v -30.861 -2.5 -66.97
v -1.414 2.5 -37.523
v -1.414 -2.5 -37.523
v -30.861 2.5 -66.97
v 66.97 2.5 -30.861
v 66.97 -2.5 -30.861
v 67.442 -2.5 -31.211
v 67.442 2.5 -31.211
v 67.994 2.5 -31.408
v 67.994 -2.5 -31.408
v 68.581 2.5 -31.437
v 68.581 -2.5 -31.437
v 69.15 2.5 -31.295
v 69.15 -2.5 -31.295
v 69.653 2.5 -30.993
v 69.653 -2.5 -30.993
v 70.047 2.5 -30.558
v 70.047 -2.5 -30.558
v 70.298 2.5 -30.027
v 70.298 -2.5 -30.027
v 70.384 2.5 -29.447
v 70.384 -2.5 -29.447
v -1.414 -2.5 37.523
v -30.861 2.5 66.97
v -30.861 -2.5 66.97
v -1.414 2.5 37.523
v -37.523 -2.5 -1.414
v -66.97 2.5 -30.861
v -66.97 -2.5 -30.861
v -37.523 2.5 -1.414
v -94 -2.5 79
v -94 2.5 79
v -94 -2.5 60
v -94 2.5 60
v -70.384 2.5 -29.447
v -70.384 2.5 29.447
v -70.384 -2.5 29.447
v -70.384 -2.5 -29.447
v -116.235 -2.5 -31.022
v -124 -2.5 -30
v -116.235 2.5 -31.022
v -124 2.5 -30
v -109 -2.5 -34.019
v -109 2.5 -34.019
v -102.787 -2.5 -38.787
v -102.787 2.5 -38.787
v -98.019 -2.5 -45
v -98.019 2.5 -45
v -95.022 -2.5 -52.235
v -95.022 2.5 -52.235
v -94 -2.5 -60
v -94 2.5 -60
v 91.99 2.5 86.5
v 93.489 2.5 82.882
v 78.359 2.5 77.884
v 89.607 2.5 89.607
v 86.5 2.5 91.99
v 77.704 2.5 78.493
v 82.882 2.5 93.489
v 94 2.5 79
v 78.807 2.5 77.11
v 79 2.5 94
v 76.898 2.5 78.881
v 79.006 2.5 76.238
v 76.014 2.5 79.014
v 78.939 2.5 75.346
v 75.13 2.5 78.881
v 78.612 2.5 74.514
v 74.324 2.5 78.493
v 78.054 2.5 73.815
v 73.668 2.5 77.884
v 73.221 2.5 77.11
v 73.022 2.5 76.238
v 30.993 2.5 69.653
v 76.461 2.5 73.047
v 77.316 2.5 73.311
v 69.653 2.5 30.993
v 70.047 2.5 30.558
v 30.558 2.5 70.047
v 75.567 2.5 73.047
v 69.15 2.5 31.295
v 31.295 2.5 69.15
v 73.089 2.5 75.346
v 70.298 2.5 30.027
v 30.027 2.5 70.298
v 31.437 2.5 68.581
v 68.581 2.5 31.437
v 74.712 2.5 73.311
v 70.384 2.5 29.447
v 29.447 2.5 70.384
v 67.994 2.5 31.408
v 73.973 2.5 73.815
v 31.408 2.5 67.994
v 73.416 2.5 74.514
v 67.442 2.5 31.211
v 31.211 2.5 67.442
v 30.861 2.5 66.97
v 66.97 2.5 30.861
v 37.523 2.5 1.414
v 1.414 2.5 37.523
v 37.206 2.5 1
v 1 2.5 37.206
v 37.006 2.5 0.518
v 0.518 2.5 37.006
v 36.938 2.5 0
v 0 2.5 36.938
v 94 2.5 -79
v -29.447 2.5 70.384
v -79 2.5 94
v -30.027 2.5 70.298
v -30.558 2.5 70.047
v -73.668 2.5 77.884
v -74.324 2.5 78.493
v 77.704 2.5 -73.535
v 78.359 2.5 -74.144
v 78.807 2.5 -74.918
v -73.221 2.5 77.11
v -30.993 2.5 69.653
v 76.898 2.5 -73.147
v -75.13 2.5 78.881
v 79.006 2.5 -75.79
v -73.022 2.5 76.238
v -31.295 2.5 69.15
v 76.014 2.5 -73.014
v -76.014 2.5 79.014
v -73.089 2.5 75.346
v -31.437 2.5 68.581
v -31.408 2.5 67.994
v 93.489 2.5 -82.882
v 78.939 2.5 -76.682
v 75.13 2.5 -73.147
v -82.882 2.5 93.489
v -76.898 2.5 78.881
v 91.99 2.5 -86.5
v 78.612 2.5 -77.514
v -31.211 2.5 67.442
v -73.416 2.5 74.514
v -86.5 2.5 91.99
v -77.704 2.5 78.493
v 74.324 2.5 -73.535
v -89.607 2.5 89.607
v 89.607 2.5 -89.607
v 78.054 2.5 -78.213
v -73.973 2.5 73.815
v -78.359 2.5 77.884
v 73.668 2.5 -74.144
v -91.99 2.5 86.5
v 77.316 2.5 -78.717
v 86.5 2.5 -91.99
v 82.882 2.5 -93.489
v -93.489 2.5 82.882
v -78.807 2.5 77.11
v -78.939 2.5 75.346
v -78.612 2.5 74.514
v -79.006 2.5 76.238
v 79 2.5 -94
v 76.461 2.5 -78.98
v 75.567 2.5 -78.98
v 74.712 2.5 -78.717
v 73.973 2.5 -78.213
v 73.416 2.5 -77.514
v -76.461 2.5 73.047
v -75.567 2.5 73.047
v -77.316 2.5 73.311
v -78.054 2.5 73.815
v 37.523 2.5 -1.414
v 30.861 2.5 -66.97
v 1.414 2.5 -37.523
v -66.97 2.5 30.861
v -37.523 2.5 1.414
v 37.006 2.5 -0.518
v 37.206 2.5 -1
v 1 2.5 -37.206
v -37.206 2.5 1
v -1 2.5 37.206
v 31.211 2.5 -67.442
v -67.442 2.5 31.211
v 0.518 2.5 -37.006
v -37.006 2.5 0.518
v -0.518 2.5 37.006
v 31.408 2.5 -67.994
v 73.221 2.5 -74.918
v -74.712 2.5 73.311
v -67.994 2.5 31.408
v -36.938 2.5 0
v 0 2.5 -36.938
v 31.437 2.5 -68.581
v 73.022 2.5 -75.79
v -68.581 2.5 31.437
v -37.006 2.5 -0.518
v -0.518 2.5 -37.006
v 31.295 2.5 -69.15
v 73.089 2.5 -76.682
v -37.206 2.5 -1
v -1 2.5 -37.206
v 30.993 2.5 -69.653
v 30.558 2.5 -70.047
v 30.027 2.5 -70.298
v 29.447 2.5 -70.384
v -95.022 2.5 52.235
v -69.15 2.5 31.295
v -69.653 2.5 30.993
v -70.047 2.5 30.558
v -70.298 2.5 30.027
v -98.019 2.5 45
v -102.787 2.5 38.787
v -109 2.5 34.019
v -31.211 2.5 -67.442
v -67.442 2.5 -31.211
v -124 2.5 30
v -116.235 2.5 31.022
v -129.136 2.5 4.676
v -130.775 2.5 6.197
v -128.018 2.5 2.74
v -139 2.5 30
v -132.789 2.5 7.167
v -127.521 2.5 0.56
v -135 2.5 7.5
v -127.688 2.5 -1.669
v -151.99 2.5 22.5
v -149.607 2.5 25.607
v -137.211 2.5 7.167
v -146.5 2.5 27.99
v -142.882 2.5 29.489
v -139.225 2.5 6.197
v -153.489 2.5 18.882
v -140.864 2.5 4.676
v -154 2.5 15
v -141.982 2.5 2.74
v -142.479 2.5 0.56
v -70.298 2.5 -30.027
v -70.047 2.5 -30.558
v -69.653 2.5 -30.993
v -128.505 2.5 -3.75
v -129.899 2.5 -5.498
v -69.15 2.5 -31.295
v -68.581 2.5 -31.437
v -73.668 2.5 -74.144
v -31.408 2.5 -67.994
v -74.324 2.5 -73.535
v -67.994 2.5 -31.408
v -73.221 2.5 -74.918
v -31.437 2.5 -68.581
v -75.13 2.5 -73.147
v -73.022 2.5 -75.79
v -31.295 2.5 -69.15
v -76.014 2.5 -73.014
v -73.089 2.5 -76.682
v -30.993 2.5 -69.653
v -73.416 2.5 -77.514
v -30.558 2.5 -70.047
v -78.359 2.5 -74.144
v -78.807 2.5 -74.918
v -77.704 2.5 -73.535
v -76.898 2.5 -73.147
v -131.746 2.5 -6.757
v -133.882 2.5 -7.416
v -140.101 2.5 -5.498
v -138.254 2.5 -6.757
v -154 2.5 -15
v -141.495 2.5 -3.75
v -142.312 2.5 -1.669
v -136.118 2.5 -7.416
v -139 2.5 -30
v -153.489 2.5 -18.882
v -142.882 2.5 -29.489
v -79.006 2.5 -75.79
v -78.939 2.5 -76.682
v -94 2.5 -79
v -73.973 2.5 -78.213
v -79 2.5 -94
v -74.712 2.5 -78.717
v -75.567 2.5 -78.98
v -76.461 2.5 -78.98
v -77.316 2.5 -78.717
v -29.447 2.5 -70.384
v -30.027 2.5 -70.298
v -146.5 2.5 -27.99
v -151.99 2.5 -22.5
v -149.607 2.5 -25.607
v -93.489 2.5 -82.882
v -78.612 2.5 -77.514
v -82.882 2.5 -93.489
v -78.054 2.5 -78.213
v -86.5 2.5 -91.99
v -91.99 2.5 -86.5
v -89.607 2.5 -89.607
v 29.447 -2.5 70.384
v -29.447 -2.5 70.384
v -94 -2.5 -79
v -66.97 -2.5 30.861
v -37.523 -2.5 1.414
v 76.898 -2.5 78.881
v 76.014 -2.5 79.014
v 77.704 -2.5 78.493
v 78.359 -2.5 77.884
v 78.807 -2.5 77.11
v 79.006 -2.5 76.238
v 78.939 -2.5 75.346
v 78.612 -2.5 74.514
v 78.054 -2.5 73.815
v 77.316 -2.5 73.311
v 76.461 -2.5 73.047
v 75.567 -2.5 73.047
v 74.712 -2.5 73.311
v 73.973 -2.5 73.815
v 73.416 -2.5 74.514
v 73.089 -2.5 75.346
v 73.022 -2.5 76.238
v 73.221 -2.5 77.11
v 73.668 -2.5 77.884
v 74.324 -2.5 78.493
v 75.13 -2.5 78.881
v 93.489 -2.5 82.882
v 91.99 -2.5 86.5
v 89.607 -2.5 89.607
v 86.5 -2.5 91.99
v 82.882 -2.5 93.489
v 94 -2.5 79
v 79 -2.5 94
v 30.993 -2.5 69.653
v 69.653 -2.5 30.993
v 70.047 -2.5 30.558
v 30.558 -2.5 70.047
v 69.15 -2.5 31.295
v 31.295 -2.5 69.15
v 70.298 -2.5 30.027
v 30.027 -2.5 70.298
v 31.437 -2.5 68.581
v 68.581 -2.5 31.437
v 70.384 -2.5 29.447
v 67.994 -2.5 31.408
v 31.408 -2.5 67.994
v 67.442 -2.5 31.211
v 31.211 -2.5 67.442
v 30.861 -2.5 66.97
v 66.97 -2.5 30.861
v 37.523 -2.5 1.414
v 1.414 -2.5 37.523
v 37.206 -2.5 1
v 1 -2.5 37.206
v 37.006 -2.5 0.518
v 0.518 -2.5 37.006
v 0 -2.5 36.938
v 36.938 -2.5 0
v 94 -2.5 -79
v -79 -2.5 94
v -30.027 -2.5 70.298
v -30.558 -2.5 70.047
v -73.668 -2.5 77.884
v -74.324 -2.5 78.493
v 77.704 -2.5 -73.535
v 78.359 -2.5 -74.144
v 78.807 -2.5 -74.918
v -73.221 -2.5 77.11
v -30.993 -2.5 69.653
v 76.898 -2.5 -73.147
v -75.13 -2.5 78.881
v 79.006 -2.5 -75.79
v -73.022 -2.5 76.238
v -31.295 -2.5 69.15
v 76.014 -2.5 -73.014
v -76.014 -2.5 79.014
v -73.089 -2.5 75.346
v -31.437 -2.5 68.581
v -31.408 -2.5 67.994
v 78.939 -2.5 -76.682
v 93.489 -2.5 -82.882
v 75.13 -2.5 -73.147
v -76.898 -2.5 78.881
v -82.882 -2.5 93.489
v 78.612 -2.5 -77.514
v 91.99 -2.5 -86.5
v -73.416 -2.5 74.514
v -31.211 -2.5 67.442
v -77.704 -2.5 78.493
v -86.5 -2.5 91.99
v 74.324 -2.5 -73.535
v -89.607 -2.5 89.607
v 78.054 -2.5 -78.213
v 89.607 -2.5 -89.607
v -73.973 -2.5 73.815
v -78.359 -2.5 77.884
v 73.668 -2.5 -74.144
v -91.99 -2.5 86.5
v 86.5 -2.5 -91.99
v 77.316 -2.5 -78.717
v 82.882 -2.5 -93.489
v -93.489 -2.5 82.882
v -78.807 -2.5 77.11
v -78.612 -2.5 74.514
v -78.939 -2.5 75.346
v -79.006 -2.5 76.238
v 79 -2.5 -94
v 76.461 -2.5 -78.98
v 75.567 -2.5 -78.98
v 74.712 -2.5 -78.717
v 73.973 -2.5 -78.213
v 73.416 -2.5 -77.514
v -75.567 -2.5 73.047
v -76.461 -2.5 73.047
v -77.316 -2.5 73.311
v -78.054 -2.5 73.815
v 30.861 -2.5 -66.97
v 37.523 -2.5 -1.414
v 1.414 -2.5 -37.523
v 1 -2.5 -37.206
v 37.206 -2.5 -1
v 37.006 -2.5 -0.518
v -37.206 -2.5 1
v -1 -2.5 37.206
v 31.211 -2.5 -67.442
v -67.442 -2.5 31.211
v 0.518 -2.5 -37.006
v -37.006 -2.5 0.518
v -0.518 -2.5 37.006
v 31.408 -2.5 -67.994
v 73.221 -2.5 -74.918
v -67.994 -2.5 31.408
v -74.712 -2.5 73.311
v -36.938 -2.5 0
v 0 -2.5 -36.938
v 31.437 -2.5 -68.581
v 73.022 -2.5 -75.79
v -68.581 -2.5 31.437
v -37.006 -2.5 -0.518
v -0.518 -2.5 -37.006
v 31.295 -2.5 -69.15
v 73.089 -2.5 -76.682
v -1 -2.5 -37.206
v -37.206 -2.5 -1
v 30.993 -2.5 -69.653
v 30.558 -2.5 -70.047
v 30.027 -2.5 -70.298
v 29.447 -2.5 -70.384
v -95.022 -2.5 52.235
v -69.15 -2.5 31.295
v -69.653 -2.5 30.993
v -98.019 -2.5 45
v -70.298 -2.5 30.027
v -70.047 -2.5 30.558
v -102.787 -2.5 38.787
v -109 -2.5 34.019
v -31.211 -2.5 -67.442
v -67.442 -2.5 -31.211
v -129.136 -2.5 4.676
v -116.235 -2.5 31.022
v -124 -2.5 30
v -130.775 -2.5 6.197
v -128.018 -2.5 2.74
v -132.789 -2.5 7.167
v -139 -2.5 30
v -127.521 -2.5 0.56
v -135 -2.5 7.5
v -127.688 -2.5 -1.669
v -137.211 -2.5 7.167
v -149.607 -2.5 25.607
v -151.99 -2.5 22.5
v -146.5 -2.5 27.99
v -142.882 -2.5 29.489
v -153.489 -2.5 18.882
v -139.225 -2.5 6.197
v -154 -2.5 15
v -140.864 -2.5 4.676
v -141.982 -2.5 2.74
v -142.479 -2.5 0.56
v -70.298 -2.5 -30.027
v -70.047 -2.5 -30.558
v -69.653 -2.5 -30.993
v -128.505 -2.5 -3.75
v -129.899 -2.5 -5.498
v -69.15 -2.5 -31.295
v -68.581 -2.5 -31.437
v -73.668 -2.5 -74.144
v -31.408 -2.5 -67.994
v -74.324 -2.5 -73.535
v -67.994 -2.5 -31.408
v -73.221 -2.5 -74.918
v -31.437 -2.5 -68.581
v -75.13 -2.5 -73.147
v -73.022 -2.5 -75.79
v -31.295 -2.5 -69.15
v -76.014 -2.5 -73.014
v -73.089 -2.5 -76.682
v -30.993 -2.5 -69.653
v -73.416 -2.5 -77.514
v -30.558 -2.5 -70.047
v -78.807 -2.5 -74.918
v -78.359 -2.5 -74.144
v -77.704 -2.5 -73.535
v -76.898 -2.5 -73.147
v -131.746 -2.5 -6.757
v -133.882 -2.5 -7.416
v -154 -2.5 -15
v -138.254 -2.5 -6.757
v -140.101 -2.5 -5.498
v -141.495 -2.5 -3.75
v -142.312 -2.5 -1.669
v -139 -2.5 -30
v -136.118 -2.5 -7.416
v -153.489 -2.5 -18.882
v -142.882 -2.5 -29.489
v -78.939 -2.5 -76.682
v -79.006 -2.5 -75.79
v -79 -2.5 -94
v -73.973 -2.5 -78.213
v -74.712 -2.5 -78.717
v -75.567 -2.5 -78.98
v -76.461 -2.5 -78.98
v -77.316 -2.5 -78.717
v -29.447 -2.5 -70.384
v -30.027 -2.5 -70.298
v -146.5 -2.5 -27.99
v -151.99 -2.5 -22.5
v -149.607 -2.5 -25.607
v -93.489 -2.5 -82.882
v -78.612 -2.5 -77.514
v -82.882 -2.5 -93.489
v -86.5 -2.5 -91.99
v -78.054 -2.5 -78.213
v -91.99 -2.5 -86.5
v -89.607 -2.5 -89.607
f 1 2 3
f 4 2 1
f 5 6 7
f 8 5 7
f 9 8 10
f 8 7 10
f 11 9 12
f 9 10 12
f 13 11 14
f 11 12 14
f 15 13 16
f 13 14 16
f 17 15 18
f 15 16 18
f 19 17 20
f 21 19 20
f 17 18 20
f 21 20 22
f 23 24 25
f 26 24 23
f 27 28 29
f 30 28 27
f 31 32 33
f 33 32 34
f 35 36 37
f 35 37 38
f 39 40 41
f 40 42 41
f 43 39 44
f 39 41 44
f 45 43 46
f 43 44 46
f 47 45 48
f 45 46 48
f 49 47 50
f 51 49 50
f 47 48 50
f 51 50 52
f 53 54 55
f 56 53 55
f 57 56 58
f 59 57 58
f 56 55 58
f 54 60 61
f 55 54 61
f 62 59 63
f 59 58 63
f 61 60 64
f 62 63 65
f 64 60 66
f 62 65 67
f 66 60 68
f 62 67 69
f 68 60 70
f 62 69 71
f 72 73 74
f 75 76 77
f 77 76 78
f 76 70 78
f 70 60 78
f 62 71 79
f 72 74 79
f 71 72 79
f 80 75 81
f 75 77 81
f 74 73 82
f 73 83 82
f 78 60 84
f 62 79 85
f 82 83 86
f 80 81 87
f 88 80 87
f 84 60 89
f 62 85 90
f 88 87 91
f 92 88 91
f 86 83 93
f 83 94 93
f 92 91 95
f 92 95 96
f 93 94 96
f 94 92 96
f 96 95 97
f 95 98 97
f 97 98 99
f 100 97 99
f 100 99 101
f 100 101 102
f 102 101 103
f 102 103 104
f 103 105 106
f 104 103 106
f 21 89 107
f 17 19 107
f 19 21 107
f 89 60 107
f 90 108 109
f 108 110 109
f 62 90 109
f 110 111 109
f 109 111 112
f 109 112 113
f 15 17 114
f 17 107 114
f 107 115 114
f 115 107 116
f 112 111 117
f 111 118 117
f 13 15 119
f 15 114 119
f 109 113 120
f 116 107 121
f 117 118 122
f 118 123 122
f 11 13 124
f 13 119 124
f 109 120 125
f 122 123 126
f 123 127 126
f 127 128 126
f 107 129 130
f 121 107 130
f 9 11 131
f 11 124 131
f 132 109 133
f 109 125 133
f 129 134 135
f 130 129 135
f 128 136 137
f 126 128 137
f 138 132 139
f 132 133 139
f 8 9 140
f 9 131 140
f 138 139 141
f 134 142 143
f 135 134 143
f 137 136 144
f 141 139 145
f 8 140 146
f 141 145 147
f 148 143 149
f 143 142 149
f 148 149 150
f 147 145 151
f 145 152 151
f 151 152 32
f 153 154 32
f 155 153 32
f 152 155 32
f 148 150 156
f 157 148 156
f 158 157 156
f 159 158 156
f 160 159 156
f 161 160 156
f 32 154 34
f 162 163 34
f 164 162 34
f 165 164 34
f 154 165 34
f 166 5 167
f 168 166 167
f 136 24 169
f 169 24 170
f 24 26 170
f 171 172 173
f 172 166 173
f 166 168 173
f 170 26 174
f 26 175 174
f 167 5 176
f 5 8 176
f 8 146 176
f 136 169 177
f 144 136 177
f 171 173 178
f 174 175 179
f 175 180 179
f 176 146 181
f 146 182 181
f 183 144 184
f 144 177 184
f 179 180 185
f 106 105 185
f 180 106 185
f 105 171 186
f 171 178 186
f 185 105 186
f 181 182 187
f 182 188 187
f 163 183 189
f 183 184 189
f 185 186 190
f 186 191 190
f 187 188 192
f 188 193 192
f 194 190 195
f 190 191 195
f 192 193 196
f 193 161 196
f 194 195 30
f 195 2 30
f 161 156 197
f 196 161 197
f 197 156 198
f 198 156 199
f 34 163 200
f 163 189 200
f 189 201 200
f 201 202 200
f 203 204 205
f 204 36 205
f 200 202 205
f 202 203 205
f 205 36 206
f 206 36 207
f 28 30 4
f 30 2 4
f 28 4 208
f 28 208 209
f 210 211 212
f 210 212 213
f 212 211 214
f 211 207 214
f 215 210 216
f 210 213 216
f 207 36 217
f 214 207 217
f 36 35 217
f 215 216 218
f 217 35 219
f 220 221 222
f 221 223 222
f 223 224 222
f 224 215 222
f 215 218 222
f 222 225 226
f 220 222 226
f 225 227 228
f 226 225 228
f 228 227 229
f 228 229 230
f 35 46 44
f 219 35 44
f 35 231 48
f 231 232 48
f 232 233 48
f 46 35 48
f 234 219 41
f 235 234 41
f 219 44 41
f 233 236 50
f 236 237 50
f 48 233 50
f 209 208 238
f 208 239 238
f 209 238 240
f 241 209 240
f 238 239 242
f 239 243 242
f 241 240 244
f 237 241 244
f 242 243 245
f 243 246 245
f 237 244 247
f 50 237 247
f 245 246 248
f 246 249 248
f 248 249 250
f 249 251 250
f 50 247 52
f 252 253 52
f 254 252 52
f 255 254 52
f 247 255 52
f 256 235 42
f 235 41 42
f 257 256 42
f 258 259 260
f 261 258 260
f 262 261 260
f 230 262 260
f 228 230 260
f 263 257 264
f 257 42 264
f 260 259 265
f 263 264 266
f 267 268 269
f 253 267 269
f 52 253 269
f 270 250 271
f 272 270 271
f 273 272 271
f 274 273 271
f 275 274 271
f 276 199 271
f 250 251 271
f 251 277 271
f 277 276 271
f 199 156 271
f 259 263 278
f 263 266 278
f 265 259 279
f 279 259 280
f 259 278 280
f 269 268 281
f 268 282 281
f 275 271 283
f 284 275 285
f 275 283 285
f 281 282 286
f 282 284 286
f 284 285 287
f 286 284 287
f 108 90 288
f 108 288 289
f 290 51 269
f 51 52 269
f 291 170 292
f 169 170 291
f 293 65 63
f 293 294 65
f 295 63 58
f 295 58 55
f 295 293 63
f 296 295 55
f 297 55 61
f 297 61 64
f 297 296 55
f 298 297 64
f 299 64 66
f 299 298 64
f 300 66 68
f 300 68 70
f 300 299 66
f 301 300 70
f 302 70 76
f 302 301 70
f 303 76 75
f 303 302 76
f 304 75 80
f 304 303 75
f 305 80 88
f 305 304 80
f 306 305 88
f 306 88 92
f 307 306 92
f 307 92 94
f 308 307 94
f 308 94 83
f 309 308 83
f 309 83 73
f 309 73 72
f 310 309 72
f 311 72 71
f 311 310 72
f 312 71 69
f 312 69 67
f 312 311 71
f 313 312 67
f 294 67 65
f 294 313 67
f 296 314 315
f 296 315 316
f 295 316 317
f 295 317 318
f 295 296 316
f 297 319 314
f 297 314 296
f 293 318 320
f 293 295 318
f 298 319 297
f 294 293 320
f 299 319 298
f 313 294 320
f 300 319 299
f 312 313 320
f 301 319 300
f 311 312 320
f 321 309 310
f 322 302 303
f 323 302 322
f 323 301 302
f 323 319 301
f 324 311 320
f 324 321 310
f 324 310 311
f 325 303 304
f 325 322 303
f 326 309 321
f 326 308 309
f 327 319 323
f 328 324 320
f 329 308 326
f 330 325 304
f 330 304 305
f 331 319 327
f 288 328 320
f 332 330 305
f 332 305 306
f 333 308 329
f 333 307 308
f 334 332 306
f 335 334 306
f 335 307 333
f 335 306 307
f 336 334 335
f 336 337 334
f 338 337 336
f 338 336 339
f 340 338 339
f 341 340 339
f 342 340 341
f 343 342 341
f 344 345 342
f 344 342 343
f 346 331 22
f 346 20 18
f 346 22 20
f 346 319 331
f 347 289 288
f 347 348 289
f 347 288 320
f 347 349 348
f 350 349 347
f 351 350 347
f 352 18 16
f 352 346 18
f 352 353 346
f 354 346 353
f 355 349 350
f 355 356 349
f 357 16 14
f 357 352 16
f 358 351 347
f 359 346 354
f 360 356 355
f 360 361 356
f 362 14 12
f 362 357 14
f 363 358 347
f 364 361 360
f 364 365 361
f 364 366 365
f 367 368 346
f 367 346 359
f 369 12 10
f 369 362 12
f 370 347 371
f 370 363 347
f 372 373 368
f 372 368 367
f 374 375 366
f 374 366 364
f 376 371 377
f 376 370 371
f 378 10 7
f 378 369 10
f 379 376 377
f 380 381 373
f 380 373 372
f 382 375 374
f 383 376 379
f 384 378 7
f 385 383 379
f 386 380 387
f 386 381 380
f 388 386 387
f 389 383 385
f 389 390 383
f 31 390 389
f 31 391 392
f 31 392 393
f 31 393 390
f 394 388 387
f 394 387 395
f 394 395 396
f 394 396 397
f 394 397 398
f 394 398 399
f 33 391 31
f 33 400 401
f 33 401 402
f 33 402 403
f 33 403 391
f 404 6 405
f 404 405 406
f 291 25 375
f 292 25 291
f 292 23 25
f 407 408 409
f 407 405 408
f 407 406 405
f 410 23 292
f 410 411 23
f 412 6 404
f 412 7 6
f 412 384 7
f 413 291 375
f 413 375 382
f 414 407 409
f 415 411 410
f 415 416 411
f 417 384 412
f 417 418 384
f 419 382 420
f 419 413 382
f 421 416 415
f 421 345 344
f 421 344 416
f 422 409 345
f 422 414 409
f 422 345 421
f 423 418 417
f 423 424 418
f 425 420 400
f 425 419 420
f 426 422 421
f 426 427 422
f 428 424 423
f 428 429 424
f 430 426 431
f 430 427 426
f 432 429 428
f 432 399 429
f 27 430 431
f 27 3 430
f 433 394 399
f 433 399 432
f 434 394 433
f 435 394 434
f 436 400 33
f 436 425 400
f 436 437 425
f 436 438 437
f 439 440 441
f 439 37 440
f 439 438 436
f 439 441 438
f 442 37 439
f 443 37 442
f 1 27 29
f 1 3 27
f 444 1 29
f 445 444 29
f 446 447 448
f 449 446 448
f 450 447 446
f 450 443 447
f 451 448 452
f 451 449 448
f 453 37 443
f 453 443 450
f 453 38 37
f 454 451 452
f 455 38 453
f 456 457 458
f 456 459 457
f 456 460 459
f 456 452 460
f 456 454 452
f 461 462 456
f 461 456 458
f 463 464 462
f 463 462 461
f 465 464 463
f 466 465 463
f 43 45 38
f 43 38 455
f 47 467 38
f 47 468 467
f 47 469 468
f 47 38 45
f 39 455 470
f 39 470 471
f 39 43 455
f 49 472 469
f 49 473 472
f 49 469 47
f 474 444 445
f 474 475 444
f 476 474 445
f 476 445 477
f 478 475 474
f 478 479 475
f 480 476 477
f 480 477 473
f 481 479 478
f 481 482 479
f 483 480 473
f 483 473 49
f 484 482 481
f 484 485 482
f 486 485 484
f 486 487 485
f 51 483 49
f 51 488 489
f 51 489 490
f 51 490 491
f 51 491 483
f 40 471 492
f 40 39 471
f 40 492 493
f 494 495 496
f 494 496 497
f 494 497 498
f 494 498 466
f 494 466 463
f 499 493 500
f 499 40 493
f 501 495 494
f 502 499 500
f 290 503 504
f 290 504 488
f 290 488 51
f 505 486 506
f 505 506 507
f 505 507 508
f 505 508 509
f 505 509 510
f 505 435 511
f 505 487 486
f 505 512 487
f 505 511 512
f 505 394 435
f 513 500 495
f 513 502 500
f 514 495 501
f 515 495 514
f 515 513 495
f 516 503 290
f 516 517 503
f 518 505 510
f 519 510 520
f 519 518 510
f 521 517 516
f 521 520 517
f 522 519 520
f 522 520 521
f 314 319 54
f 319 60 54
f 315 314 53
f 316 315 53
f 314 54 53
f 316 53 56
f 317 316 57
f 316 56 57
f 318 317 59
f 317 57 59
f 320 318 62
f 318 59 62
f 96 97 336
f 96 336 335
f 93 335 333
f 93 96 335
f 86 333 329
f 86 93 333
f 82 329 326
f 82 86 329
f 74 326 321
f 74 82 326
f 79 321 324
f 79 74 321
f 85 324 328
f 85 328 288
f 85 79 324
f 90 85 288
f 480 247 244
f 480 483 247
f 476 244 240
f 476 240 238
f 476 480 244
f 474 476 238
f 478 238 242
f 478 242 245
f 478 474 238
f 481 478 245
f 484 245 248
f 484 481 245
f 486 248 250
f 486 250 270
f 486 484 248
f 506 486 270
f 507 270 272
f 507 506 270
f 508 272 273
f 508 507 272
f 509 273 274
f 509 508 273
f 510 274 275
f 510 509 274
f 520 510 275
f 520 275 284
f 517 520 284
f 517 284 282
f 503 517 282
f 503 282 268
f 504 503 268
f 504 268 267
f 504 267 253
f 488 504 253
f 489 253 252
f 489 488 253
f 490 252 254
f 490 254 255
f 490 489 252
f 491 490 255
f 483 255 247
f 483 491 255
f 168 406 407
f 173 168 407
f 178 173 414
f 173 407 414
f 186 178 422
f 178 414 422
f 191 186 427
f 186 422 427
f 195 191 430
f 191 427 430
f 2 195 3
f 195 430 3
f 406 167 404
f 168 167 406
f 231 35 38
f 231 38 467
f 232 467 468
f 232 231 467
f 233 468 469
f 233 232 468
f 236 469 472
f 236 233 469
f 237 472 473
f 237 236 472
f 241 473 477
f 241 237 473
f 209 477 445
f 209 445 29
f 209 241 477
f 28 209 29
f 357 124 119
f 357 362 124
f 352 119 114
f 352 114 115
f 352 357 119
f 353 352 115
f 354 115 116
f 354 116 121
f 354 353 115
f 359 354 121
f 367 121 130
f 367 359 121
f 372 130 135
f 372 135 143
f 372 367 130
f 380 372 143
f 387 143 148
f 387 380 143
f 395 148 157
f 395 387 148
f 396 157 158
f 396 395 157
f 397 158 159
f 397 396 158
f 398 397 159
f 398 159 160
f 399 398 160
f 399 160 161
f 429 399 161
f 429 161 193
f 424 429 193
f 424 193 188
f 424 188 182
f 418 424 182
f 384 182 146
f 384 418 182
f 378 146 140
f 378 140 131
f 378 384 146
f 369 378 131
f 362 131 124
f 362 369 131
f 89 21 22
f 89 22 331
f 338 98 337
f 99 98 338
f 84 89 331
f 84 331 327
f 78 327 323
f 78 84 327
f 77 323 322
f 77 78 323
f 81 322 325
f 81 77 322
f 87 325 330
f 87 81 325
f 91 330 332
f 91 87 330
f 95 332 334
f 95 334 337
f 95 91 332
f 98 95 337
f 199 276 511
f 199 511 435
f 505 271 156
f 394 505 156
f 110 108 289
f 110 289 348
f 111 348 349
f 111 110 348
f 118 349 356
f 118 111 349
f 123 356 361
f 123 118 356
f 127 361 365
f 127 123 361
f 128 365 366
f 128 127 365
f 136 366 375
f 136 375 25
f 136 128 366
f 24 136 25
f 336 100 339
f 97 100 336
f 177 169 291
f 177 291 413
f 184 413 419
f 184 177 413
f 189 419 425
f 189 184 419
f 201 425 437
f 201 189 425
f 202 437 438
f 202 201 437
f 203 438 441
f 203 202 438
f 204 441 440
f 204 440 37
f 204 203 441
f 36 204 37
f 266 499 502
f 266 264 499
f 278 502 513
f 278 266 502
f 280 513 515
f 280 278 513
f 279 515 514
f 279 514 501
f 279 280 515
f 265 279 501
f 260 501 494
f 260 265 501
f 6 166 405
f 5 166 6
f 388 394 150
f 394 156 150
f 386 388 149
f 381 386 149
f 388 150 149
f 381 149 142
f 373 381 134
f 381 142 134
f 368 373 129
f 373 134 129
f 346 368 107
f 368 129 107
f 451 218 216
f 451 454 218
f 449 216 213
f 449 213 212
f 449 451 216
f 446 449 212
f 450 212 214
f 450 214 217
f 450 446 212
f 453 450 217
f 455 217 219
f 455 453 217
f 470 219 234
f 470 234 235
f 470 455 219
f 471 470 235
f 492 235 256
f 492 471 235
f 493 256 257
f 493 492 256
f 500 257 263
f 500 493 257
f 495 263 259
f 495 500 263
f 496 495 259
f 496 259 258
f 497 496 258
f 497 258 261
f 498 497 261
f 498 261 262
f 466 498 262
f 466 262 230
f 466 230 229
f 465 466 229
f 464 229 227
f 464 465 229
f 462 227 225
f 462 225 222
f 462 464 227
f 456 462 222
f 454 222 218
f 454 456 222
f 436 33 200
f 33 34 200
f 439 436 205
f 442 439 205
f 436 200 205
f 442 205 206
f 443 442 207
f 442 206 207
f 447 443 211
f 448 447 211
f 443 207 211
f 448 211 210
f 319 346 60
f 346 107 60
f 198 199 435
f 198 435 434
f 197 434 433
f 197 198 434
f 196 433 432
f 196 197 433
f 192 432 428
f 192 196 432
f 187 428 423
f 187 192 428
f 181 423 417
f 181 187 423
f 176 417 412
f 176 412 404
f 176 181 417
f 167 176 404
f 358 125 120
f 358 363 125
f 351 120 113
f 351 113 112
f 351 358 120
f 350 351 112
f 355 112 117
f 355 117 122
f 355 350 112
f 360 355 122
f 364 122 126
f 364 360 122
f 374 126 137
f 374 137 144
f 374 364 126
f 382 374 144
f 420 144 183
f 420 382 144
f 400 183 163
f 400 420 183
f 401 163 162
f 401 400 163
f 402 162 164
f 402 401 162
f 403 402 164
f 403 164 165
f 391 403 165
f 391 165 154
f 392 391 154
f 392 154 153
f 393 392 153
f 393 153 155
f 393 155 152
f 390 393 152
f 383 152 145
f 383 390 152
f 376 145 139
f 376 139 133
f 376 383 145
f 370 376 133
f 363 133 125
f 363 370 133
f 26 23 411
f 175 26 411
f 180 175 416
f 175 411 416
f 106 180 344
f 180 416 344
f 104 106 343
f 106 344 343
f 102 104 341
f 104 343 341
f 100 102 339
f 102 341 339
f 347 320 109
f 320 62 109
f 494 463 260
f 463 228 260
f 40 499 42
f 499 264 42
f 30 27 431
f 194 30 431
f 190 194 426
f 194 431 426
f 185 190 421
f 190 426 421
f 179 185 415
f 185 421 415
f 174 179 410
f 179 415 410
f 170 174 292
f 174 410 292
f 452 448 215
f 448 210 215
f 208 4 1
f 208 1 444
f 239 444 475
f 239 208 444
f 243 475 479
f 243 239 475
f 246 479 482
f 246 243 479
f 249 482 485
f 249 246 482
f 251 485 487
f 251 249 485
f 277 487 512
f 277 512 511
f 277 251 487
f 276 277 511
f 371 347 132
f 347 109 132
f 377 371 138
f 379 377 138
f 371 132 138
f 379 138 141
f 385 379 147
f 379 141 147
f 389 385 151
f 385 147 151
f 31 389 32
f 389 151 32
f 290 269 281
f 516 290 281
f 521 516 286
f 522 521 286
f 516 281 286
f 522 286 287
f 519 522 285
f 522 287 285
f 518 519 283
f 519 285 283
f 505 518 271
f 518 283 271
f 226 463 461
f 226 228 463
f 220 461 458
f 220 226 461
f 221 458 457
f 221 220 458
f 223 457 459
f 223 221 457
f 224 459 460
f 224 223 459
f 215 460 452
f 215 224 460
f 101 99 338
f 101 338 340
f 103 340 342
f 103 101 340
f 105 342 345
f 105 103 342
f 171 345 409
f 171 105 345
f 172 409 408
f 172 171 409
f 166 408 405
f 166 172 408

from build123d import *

# Parameters (mm, degrees)
SKETCH1_R           = 3
SKETCH1_R_2         = 7.5
BOSS_EXTRUDE1_DEPTH = 2.5
FILLET1_R           = 30
FILLET2_R           = 15


with BuildPart() as part:
    # Sketch1 → Boss-Extrude1 (new, symmetric)
    with BuildSketch(Plane(origin=(0, 0, 0), x_dir=(1, 0, 0), z_dir=(0, 1, 0))):
        with BuildLine():
            Line((-79, 94), (79, 94))
            ThreePointArc((79, 94), (89.606601718, 89.606601718), (94, 79))
            Line((94, 79), (94, -79))
            ThreePointArc((94, -79), (89.606601718, -89.606601718), (79, -94))
            Line((79, -94), (-79, -94))
            ThreePointArc((-79, -94), (-89.606601718, -89.606601718), (-94, -79))
            Line((-94, -79), (-94, -30))
            Line((-94, -30), (-154, -30))
            Line((-154, -30), (-154, 30))
            Line((-154, 30), (-94, 30))
            Line((-94, 30), (-94, 79))
            ThreePointArc((-94, 79), (-89.606601718, 89.606601718), (-79, 94))
        make_face()
        with Locations(Location((-76.013978978, 76.013978978, 0), (0, 0, 270))):
            Circle(SKETCH1_R, mode=Mode.SUBTRACT)
        with Locations(Location((76.013978978, 76.013978978, 0), (0, 0, 270))):
            Circle(SKETCH1_R, mode=Mode.SUBTRACT)
        with Locations(Location((76.013978978, -76.013978978, 0), (0, 0, 270))):
            Circle(SKETCH1_R, mode=Mode.SUBTRACT)
        with Locations(Location((-76.013978978, -76.013978978, 0), (0, 0, 270))):
            Circle(SKETCH1_R, mode=Mode.SUBTRACT)
        with Locations(Location((-135, 0, 0), (0, 0, 270))):
            Circle(SKETCH1_R_2, mode=Mode.SUBTRACT)
        with BuildLine():
            Line((29.446798758, -70.384478511), (-29.446798758, -70.384478511))
            ThreePointArc((-29.446798758, -70.384478511), (-31.294557823, -69.149845375), (-30.86101232, -66.970264948))
            Line((-30.86101232, -66.970264948), (-1.414213562, -37.52346619))
            ThreePointArc((-1.414213562, -37.52346619), (0, -36.937679753), (1.414213562, -37.52346619))
            Line((1.414213562, -37.52346619), (30.86101232, -66.970264948))
            ThreePointArc((30.86101232, -66.970264948), (31.294557823, -69.149845375), (29.446798758, -70.384478511))
        make_face(mode=Mode.SUBTRACT)
        with BuildLine():
            Line((-70.384478511, -29.446798758), (-70.384478511, 29.446798758))
            ThreePointArc((-70.384478511, 29.446798758), (-69.149845375, 31.294557823), (-66.970264948, 30.86101232))
            Line((-66.970264948, 30.86101232), (-37.52346619, 1.414213562))
            ThreePointArc((-37.52346619, 1.414213562), (-36.937679753, 0), (-37.52346619, -1.414213562))
            Line((-37.52346619, -1.414213562), (-66.970264948, -30.86101232))
            ThreePointArc((-66.970264948, -30.86101232), (-69.149845375, -31.294557823), (-70.384478511, -29.446798758))
        make_face(mode=Mode.SUBTRACT)
        with BuildLine():
            Line((-29.446798758, 70.384478511), (29.446798758, 70.384478511))
            ThreePointArc((29.446798758, 70.384478511), (31.294557823, 69.149845375), (30.86101232, 66.970264948))
            Line((30.86101232, 66.970264948), (1.414213562, 37.52346619))
            ThreePointArc((1.414213562, 37.52346619), (0, 36.937679753), (-1.414213562, 37.52346619))
            Line((-1.414213562, 37.52346619), (-30.86101232, 66.970264948))
            ThreePointArc((-30.86101232, 66.970264948), (-31.294557823, 69.149845375), (-29.446798758, 70.384478511))
        make_face(mode=Mode.SUBTRACT)
        with BuildLine():
            Line((70.384478511, 29.446798758), (70.384478511, -29.446798758))
            ThreePointArc((70.384478511, -29.446798758), (69.149845375, -31.294557823), (66.970264948, -30.86101232))
            Line((66.970264948, -30.86101232), (37.52346619, -1.414213562))
            ThreePointArc((37.52346619, -1.414213562), (36.937679753, 0), (37.52346619, 1.414213562))
            Line((37.52346619, 1.414213562), (66.970264948, 30.86101232))
            ThreePointArc((66.970264948, 30.86101232), (69.149845375, 31.294557823), (70.384478511, 29.446798758))
        make_face(mode=Mode.SUBTRACT)
    extrude(amount=BOSS_EXTRUDE1_DEPTH, both=True)

    # Fillet1
    fillet1_edges = [part.edges().sort_by_distance(p)[0] for p in [
        (-94, 0, 30),
        (-94, 0, -30),
    ]]
    fillet(fillet1_edges, radius=FILLET1_R)

    # Fillet2
    fillet2_edges = [part.edges().sort_by_distance(p)[0] for p in [
        (-154, 0, 30),
        (-154, 0, -30),
    ]]
    fillet(fillet2_edges, radius=FILLET2_R)


solid = part.part
